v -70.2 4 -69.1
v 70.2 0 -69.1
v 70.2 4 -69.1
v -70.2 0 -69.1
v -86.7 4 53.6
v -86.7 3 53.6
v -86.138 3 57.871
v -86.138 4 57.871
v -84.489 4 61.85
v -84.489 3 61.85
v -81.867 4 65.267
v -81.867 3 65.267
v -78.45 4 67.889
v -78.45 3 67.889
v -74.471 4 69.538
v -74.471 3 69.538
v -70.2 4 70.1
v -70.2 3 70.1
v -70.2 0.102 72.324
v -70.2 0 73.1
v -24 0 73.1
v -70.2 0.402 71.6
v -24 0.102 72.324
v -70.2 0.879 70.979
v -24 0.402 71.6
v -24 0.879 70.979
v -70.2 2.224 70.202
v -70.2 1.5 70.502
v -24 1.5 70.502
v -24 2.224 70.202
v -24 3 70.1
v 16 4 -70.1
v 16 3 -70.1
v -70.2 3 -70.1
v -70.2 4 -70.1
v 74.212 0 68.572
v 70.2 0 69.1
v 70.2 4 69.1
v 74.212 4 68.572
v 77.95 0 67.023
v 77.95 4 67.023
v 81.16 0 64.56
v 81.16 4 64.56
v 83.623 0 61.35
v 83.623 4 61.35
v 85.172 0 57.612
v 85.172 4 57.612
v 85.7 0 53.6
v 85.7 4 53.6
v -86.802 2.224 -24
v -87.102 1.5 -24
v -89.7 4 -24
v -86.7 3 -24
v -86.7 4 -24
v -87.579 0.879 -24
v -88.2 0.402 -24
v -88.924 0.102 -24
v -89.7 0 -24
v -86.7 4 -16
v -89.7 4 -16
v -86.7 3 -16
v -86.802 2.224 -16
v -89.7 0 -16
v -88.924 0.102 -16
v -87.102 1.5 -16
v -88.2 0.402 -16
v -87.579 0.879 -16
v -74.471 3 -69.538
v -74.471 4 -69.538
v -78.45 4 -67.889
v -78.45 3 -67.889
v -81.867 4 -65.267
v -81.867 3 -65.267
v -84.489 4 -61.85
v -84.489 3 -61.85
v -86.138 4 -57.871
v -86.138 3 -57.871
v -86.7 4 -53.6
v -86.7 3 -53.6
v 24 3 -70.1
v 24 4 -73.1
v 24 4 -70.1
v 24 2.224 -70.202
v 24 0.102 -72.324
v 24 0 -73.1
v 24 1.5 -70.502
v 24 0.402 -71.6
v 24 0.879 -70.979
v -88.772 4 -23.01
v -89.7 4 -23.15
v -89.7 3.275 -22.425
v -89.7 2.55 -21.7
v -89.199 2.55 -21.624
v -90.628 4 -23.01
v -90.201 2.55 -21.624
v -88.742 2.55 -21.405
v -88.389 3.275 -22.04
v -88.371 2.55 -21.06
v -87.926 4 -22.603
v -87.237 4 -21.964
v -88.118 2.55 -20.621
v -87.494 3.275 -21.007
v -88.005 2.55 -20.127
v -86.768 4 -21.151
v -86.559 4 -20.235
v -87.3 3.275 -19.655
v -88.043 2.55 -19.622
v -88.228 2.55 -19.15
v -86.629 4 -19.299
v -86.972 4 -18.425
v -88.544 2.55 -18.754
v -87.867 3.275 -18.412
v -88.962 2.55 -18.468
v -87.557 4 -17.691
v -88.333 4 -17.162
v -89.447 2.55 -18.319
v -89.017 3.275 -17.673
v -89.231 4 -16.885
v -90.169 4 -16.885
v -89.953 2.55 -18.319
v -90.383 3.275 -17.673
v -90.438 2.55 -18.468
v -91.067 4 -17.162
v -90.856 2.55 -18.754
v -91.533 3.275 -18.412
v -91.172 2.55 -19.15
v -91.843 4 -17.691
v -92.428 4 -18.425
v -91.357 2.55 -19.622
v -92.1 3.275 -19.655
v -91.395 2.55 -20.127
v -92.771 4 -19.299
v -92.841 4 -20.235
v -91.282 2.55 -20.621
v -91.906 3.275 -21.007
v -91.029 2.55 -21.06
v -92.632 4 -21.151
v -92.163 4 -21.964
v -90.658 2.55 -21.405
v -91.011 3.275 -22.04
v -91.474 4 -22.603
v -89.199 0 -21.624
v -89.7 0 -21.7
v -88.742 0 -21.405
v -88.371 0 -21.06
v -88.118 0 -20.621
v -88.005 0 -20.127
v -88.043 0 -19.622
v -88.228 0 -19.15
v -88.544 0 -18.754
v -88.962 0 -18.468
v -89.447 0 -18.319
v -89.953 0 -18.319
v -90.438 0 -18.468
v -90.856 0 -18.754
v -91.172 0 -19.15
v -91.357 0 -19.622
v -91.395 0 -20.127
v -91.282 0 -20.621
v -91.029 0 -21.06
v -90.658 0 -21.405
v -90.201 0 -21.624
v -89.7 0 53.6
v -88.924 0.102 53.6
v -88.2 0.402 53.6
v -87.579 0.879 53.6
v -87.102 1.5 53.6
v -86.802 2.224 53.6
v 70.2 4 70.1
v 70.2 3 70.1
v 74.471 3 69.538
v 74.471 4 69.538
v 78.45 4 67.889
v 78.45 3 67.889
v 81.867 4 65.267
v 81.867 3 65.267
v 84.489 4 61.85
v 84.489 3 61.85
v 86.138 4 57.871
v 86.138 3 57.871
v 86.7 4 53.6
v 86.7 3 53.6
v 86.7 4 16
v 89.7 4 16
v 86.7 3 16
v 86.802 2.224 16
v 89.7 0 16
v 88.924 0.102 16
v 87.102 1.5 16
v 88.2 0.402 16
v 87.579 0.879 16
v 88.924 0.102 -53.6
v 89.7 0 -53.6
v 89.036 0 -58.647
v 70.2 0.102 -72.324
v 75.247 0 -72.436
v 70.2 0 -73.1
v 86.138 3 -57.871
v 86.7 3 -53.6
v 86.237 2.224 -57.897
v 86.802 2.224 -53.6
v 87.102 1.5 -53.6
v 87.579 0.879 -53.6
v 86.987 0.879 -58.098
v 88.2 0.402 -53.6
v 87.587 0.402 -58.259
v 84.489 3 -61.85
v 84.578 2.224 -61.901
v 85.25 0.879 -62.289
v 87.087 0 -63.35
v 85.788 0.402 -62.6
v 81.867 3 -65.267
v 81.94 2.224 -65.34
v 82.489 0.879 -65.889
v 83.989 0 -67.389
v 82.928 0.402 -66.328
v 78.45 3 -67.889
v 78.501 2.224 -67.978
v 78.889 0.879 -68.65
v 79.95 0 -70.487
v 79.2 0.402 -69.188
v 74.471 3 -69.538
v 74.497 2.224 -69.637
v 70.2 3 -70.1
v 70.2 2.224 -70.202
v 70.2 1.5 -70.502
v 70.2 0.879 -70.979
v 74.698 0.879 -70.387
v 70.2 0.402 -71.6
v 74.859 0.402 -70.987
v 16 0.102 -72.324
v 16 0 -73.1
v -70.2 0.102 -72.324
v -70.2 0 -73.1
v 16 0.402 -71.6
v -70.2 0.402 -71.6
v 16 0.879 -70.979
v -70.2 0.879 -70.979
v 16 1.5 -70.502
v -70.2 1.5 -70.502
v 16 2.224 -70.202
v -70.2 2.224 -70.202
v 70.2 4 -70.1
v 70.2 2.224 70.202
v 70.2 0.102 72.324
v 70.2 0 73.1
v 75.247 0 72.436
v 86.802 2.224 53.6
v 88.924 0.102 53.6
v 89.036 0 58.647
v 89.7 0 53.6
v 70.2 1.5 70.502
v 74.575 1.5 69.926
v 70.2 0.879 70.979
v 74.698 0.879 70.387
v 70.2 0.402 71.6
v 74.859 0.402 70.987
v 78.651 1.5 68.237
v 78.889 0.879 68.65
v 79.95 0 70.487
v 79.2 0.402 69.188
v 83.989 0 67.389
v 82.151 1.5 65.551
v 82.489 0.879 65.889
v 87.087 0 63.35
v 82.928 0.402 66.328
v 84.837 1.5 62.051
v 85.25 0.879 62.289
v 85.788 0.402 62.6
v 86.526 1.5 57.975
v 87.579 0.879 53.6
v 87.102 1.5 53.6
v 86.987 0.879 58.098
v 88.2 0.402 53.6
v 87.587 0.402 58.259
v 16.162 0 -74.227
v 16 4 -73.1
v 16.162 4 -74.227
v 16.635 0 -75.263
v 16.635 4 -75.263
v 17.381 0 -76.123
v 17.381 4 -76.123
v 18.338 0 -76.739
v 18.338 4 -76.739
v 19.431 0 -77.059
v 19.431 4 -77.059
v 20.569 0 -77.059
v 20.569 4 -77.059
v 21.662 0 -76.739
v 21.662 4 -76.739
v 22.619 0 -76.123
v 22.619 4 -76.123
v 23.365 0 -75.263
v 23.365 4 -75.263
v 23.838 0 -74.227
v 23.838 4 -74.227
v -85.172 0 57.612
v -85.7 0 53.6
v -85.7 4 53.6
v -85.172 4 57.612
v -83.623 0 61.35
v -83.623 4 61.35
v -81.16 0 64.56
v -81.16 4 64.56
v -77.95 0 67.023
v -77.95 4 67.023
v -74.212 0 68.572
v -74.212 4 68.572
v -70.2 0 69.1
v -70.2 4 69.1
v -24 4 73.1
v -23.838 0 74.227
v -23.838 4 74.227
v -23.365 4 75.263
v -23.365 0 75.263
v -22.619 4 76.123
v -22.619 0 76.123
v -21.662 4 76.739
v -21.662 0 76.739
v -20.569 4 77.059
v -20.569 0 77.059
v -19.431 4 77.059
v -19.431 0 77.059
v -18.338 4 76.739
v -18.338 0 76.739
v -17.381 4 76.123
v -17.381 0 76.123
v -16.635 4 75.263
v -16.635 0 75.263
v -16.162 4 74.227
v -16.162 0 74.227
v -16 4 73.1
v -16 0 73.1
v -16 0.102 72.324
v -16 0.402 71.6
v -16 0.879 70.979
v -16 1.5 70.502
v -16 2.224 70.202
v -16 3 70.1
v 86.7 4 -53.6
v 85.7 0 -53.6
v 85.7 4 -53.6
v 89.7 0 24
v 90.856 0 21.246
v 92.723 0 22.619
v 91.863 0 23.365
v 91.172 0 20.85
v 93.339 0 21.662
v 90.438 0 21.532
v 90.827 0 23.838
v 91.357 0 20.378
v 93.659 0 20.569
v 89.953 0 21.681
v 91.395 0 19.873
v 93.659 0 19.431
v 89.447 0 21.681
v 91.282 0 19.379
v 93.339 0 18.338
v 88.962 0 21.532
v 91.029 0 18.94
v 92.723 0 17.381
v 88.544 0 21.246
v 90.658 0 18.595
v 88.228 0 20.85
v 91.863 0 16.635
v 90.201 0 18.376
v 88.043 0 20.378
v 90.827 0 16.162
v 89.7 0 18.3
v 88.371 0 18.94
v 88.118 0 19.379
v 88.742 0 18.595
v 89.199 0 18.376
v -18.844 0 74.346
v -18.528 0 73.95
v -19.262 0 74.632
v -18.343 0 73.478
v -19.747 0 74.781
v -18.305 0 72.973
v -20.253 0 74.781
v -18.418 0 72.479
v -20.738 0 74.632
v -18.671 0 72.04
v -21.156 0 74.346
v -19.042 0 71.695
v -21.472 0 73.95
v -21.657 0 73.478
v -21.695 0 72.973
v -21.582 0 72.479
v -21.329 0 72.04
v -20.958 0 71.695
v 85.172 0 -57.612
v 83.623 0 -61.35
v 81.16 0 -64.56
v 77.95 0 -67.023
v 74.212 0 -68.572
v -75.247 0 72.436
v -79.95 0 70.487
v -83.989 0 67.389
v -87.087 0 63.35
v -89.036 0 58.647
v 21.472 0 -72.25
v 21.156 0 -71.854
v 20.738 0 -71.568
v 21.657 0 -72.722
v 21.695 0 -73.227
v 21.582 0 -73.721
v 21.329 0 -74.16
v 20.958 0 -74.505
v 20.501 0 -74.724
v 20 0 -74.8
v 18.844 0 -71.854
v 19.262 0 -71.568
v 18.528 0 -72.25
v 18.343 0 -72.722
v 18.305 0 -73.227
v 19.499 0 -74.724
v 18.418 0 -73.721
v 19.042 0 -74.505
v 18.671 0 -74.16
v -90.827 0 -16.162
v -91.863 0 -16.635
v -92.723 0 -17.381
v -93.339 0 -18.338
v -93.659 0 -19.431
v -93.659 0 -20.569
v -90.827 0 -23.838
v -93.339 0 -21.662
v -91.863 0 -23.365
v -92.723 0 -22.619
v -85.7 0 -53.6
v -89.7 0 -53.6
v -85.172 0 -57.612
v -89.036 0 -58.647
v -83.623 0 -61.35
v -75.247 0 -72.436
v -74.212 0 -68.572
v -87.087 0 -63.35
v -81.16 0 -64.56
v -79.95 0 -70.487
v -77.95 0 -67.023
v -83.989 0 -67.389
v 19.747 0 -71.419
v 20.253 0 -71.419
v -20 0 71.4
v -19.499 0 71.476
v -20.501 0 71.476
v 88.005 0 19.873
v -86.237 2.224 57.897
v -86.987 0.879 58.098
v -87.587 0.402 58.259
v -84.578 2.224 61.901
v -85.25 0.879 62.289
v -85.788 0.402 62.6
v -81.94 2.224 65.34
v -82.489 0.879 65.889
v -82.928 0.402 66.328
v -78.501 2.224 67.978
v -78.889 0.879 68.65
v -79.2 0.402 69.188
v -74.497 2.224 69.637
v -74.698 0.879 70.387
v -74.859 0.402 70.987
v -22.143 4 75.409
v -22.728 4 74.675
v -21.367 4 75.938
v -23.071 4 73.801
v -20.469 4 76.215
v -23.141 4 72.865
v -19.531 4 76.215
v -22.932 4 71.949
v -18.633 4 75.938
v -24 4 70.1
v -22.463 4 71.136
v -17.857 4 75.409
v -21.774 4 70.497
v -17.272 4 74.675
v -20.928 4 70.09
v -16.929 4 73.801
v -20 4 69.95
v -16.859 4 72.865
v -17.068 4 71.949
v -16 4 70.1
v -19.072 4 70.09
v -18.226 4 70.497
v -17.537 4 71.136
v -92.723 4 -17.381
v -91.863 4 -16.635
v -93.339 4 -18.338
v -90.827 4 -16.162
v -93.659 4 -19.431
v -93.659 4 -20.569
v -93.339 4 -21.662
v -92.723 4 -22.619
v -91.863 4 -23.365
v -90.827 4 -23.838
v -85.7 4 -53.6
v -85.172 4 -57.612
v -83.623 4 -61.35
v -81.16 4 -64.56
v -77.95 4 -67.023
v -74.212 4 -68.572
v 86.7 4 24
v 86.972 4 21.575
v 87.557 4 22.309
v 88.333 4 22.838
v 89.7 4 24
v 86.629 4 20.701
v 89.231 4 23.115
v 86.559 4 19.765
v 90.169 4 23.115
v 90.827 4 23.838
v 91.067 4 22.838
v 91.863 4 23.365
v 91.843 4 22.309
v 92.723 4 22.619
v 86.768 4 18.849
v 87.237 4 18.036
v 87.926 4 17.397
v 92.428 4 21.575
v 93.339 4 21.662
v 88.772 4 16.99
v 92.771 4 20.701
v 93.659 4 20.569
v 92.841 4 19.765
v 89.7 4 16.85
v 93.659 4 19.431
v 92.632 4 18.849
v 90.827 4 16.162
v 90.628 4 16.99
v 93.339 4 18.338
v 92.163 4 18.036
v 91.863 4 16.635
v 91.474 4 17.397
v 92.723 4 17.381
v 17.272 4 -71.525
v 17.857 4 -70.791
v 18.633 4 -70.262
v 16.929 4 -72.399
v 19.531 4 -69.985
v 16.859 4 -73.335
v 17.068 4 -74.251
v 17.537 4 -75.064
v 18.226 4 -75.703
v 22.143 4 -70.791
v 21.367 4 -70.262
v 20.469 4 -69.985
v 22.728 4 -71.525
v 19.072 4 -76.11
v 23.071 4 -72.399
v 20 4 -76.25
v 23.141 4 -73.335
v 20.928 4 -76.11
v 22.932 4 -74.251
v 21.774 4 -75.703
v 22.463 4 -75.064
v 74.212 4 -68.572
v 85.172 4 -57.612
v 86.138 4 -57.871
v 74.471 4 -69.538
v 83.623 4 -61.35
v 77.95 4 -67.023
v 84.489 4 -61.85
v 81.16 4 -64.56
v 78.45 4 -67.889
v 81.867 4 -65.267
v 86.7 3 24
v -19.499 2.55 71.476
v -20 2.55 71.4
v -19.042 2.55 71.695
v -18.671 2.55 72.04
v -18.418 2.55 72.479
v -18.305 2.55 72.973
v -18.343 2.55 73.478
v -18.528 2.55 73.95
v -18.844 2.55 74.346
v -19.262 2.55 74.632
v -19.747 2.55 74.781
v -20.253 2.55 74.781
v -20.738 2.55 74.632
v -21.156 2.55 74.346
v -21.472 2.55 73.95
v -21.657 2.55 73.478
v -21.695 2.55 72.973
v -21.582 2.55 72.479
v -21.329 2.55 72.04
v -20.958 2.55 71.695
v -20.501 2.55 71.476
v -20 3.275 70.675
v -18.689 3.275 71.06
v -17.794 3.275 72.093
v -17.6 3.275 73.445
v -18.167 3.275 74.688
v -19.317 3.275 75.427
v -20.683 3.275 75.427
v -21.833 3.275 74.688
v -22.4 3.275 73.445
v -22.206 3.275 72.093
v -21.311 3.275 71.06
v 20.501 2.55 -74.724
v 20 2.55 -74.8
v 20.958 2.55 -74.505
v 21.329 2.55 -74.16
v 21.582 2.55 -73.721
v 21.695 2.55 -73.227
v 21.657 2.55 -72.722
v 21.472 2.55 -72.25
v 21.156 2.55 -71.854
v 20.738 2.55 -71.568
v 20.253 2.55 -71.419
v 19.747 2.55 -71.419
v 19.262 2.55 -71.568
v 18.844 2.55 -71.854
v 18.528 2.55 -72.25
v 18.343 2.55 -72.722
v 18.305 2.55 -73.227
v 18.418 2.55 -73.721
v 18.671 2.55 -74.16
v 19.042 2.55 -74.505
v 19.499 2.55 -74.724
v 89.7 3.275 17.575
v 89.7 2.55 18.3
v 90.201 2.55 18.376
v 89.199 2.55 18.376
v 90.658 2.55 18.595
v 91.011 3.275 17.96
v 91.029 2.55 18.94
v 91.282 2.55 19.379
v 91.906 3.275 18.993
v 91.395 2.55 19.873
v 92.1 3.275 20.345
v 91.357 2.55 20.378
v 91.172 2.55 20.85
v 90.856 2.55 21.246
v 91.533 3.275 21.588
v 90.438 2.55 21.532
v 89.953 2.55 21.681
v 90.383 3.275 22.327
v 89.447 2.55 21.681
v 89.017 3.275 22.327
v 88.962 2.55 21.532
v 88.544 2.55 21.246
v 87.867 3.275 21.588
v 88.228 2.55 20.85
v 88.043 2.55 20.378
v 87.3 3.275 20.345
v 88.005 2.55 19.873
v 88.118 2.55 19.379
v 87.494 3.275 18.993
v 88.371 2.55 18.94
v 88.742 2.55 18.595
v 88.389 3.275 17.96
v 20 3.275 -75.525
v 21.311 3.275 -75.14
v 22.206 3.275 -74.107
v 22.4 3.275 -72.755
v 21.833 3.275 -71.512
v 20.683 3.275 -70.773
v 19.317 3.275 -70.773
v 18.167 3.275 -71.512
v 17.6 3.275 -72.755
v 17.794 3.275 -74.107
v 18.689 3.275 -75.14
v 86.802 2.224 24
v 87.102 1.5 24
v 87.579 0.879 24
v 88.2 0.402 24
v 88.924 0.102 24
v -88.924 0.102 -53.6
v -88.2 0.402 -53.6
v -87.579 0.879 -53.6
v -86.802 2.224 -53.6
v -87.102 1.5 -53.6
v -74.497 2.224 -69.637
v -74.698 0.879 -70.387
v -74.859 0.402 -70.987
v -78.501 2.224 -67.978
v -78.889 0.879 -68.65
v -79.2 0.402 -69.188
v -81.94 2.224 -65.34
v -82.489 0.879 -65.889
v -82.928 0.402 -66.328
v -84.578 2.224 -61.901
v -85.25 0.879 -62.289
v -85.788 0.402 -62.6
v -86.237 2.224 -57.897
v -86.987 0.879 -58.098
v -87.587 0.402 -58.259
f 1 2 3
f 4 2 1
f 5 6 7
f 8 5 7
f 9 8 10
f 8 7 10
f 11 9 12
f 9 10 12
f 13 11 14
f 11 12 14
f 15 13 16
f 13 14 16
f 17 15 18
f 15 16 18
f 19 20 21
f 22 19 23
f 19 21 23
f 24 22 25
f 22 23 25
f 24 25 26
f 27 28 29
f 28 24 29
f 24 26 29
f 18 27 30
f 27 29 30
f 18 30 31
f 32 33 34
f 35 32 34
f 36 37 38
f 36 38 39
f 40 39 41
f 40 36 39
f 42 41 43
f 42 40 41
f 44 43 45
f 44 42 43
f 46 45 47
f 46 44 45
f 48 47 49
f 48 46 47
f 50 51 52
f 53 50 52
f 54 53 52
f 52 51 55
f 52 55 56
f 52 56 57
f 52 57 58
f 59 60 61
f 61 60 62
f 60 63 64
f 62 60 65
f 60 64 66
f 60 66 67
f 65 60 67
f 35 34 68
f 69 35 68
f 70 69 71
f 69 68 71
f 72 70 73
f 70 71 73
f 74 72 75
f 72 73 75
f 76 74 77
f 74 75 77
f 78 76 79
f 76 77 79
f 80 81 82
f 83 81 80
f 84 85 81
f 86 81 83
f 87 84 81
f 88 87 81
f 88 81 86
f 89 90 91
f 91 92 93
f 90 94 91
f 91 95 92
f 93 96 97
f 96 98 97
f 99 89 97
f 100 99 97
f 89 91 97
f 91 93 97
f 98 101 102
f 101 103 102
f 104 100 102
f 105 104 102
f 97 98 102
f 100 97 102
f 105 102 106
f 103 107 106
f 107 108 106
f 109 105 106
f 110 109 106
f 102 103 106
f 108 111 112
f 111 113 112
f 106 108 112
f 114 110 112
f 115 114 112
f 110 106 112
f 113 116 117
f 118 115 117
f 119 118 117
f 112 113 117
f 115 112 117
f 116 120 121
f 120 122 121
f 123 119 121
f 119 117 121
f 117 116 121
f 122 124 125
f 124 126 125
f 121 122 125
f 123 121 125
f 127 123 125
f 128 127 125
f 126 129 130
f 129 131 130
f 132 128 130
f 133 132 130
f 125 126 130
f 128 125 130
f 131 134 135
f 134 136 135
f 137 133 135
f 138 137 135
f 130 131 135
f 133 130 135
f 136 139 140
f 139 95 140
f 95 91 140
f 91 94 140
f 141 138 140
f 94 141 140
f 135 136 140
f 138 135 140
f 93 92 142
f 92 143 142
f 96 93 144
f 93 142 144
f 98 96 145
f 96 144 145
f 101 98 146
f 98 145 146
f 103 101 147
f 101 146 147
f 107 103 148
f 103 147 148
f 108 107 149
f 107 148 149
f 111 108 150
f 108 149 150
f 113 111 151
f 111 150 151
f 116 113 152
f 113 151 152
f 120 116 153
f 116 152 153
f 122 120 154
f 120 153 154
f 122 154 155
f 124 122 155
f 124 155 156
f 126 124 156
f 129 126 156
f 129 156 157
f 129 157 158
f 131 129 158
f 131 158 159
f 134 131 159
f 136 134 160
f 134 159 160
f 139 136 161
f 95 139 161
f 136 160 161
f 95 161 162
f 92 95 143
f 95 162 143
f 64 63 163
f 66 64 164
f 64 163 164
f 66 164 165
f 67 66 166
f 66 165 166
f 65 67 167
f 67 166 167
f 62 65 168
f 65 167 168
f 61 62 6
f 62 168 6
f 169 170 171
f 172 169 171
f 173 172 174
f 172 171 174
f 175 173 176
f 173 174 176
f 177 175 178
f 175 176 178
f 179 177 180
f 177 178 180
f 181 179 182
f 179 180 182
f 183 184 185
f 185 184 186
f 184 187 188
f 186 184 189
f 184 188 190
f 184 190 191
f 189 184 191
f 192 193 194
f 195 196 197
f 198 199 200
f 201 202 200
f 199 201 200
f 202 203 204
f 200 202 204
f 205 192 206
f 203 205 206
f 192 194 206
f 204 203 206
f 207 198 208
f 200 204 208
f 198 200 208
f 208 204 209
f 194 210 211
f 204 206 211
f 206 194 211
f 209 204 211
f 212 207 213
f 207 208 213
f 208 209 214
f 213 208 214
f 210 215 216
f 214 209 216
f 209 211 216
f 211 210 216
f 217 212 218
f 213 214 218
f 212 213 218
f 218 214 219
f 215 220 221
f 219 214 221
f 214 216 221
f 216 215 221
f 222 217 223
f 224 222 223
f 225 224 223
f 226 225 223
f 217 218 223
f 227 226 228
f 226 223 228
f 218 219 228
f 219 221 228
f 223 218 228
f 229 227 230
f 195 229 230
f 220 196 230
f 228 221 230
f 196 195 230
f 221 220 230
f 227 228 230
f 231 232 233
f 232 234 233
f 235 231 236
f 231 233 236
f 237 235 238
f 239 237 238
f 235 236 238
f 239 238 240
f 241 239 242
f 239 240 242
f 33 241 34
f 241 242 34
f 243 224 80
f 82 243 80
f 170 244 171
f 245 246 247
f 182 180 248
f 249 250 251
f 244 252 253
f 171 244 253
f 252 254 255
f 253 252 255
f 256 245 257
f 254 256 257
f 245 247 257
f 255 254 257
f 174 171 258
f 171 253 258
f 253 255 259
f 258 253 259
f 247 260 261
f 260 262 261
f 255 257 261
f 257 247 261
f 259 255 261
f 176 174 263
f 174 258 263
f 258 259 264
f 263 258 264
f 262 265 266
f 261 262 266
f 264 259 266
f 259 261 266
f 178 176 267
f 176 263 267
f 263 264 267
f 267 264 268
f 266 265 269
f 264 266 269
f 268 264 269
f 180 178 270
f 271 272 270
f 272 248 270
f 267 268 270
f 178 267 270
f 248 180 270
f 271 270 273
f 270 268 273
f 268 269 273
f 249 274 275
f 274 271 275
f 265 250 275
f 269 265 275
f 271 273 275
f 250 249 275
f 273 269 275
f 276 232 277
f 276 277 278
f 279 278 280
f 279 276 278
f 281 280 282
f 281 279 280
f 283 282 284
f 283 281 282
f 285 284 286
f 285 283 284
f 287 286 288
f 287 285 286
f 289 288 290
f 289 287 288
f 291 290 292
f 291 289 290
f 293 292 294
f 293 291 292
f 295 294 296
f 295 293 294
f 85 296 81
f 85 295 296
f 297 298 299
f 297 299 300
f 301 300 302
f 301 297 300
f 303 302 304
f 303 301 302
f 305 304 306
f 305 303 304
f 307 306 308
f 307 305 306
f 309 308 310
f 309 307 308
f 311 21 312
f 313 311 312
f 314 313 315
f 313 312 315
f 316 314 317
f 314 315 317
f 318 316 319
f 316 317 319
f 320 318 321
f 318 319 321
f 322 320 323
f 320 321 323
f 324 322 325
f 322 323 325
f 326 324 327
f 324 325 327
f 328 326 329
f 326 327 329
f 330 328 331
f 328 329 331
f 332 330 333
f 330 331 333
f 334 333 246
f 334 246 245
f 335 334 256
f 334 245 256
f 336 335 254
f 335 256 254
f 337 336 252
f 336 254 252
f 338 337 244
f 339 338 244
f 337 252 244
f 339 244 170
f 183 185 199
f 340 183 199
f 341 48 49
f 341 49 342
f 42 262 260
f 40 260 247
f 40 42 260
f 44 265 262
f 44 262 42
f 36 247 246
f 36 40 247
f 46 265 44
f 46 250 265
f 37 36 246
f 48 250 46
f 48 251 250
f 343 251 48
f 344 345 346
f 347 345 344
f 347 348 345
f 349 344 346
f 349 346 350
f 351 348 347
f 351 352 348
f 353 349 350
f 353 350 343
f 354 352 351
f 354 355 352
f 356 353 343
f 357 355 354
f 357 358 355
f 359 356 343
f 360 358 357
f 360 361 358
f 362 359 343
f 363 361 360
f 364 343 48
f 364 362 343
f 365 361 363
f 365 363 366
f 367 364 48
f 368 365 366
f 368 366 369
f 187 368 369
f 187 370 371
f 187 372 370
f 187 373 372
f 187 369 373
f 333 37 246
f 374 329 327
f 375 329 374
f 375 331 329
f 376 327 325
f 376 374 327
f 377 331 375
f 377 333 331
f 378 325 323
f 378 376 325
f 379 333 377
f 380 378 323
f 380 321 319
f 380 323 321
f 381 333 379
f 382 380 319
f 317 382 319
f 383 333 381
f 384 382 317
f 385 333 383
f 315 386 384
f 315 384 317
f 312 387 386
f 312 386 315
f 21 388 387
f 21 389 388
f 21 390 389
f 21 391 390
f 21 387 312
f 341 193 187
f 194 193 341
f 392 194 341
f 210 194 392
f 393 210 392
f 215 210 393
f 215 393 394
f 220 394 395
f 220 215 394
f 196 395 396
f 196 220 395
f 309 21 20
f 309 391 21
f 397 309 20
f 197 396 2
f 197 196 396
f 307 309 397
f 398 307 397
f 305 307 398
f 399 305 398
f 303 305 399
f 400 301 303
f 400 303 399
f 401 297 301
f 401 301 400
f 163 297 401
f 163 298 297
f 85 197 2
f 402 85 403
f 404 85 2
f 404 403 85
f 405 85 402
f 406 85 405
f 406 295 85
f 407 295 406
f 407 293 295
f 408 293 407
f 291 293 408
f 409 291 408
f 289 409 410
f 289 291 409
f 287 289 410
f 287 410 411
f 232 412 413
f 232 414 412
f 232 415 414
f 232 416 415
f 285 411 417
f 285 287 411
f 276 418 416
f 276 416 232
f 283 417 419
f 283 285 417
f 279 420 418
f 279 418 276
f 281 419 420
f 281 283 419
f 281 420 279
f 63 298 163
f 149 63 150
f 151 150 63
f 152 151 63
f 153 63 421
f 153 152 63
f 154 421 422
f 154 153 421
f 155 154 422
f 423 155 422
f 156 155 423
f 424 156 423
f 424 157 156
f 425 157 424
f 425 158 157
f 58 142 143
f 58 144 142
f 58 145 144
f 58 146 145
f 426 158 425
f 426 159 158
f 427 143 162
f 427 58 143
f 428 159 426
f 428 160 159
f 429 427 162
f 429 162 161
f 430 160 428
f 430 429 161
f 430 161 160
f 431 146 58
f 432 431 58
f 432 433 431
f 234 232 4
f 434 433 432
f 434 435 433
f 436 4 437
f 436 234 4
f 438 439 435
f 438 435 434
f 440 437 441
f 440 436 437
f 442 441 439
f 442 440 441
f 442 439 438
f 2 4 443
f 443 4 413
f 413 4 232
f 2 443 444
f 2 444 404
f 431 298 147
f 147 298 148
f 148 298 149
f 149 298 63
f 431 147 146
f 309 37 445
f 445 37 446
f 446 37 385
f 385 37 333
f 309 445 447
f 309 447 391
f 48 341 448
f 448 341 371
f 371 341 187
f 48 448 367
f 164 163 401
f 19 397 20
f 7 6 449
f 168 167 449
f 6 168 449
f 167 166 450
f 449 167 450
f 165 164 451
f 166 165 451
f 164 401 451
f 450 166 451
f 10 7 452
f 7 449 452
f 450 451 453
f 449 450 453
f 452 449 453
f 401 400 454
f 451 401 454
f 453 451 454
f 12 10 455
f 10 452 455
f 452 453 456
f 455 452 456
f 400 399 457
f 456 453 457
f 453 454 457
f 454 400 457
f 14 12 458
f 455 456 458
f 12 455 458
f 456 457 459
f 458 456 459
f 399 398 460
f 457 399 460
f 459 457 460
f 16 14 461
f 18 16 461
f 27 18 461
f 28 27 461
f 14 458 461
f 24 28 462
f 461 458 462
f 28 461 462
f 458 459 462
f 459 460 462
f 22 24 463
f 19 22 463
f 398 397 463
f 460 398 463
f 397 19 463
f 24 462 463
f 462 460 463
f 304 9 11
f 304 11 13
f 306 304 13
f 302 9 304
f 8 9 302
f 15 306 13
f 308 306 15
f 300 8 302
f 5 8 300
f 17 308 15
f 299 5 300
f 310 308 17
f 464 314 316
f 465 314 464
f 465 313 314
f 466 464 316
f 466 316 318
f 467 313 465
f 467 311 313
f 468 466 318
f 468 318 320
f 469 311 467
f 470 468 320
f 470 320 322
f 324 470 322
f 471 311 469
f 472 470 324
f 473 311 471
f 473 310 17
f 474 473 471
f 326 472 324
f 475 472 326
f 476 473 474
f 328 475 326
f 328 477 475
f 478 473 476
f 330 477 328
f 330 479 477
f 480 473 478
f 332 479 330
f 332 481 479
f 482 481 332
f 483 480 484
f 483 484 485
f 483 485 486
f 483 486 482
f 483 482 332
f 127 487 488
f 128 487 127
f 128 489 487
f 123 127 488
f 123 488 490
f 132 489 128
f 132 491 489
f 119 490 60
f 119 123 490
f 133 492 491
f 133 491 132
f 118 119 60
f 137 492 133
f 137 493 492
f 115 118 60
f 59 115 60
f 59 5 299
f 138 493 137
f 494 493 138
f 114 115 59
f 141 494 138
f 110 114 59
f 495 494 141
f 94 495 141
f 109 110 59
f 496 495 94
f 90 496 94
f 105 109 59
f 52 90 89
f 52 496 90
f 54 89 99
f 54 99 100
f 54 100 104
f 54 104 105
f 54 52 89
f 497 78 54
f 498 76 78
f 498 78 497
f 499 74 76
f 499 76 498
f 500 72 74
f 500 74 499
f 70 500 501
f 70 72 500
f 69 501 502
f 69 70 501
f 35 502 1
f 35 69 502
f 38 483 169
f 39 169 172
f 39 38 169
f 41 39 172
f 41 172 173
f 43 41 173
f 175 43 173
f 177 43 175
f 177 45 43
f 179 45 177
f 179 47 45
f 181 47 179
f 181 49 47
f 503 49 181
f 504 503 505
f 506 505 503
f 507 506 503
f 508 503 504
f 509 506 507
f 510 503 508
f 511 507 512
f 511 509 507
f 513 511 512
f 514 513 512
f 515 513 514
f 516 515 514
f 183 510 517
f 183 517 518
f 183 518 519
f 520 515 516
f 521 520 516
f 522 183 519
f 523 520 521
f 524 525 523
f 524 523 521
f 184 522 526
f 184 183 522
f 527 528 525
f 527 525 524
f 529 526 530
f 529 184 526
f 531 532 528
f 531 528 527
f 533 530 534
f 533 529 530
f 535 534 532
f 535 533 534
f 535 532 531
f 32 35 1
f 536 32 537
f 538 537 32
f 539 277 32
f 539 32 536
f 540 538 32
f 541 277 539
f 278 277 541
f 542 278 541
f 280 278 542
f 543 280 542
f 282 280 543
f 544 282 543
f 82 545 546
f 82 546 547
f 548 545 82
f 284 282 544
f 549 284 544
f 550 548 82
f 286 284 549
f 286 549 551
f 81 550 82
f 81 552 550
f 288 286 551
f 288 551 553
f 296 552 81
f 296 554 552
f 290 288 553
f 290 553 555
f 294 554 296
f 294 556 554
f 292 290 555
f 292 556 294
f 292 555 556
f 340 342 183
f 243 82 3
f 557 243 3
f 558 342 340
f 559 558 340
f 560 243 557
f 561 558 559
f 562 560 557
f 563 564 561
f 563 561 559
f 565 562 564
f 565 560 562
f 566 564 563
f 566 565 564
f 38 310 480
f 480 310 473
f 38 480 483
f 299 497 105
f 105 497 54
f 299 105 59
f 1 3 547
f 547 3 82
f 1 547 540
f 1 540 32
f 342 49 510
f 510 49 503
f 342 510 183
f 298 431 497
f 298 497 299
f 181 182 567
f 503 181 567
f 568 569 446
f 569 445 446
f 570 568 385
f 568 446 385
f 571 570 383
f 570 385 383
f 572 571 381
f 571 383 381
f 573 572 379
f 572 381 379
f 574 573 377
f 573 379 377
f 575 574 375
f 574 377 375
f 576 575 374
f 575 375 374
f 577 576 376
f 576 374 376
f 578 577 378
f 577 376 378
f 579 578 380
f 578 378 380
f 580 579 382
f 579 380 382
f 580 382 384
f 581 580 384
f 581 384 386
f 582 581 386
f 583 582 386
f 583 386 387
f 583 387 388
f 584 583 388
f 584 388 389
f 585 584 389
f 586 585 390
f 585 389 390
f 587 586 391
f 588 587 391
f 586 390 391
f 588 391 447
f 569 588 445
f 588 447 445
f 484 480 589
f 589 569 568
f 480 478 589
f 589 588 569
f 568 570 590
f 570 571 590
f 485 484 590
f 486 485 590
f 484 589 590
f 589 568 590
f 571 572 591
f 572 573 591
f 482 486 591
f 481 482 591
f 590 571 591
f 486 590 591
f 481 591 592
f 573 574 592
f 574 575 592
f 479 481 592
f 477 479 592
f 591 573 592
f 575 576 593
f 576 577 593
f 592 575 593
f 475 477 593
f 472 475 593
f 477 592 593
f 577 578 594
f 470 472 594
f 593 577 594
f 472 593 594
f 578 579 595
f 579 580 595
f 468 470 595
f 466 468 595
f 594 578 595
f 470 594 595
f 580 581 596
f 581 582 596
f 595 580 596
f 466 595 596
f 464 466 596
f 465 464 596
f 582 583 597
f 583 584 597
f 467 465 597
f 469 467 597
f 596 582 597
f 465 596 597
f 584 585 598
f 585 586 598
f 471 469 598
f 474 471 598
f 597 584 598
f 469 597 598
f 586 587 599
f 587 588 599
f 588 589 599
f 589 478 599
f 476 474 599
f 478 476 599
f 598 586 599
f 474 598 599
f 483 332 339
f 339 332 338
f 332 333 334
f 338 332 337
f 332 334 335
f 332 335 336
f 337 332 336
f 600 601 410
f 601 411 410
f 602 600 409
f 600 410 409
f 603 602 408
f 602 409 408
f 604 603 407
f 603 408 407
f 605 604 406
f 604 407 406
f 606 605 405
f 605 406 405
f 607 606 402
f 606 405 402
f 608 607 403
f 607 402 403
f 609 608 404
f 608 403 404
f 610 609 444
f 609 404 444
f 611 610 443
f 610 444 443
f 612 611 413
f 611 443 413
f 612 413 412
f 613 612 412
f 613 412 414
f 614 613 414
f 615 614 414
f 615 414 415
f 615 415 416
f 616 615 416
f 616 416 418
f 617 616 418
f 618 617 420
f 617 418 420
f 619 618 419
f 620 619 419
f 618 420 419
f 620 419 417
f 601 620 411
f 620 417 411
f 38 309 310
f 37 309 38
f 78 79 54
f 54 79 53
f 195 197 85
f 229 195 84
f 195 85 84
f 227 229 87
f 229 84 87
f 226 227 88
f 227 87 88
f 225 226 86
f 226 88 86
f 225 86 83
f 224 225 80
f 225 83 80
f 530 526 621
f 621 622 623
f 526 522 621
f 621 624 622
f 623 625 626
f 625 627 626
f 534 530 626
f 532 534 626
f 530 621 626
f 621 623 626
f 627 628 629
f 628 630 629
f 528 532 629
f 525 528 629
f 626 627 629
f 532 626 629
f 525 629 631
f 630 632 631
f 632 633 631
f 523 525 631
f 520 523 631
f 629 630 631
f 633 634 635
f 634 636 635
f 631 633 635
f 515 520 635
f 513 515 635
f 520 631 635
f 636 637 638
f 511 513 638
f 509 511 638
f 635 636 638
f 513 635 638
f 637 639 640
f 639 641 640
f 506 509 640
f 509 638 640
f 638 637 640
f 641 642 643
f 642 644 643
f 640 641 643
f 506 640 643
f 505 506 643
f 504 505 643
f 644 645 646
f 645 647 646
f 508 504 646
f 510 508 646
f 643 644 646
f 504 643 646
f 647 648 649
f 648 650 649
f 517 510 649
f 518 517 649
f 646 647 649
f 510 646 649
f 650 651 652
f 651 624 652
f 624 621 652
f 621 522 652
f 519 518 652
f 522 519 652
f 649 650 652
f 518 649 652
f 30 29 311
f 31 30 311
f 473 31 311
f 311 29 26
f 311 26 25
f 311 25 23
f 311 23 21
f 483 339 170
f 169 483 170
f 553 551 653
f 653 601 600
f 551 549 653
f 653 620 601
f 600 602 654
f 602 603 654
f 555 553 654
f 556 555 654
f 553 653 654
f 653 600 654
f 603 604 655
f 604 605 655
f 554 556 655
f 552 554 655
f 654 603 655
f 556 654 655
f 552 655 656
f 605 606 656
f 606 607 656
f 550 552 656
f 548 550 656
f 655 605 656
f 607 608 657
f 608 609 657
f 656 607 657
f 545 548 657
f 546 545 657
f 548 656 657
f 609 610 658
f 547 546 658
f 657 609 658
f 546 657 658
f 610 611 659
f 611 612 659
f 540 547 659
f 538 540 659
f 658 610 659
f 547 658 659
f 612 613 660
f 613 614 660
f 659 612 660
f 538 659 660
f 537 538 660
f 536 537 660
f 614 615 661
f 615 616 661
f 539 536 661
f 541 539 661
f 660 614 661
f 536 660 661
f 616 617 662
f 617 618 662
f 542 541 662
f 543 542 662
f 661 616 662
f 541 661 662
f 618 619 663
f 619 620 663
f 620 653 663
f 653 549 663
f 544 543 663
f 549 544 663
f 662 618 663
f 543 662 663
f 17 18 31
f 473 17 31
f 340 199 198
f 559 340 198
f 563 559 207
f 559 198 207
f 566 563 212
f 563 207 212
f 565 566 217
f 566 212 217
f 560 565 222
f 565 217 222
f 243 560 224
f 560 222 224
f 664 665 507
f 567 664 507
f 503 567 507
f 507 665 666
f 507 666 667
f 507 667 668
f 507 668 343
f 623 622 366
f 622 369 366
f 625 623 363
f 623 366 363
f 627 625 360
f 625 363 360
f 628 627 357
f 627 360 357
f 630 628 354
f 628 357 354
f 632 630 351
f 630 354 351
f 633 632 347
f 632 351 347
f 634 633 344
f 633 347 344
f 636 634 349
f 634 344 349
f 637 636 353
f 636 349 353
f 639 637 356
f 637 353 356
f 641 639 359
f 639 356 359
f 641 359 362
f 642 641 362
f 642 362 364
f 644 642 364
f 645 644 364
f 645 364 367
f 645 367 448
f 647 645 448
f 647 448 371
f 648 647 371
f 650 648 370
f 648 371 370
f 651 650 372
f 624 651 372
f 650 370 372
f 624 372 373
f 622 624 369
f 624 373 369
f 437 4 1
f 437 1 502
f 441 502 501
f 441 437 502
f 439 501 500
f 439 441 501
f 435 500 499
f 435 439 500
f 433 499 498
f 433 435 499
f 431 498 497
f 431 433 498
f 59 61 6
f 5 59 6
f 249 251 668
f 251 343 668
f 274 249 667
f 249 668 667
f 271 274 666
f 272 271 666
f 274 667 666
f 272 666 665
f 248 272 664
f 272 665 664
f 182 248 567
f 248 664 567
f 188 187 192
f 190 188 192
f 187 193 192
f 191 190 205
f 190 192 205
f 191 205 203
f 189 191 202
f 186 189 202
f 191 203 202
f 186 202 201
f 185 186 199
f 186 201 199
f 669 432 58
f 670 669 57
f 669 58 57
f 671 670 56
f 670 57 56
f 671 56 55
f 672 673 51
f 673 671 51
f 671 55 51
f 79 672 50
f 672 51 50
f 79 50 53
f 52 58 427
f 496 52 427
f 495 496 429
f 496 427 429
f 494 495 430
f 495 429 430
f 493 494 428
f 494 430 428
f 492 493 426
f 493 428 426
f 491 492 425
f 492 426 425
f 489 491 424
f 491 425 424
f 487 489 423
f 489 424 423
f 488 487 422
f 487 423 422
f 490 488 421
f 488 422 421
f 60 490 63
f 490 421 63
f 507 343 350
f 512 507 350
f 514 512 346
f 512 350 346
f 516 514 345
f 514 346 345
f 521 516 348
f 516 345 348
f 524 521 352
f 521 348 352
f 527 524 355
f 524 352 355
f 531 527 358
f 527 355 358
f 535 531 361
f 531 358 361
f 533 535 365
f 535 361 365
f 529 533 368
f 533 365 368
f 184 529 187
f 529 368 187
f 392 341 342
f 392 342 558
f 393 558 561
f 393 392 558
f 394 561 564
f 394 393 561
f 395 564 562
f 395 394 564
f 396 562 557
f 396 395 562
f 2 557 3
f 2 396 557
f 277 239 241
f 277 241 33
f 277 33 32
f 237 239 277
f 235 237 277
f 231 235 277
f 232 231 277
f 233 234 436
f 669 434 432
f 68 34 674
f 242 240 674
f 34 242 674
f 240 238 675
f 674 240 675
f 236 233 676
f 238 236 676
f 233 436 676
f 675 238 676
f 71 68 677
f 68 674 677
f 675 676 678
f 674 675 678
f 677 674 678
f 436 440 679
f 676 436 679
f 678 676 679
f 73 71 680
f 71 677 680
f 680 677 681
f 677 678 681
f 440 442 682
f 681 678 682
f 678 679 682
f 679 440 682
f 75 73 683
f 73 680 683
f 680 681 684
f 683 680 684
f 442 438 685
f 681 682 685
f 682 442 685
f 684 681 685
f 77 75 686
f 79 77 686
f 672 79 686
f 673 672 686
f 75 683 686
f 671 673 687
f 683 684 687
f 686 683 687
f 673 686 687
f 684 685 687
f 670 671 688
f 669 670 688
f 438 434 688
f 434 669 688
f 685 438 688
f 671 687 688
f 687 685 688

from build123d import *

# Parameters (mm, degrees)
BOSS_EXTRUDE1_DEPTH                             = 4
SKETCH2_R                                       = 1.6
BOSS_EXTRUDE2_DEPTH                             = 4
CSK_FOR_M3_FLAT_HEAD_MACHINE_SCREW1_D           = 3.4
CSK_FOR_M3_FLAT_HEAD_MACHINE_SCREW1_CSINK_D     = 6.3
CSK_FOR_M3_FLAT_HEAD_MACHINE_SCREW1_CSINK_ANGLE = 90


with BuildPart() as part:
    # Sketch1 → Boss-Extrude1 (new body)
    with BuildSketch(Plane(origin=(0, 0, 0), x_dir=(1, 0, 0), z_dir=(0, 1, 0))):
        with BuildLine():
            Line((86.7, -53.6), (86.7, 53.6))
            ThreePointArc((86.7, 53.6), (81.86726189, 65.26726189), (70.2, 70.1))
            Line((70.2, 70.1), (-70.2, 70.1))
            ThreePointArc((-70.2, 70.1), (-81.86726189, 65.26726189), (-86.7, 53.6))
            Line((-86.7, 53.6), (-86.7, -53.6))
            ThreePointArc((-86.7, -53.6), (-81.86726189, -65.26726189), (-70.2, -70.1))
            Line((-70.2, -70.1), (70.2, -70.1))
            ThreePointArc((70.2, -70.1), (81.86726189, -65.26726189), (86.7, -53.6))
        make_face()
        with BuildLine():
            Line((-70.2, -69.1), (70.2, -69.1))
            ThreePointArc((70.2, -69.1), (81.160155108, -64.560155108), (85.7, -53.6))
            Line((85.7, -53.6), (85.7, 53.6))
            ThreePointArc((85.7, 53.6), (81.160155108, 64.560155108), (70.2, 69.1))
            Line((70.2, 69.1), (-70.2, 69.1))
            ThreePointArc((-70.2, 69.1), (-81.160155108, 64.560155108), (-85.7, 53.6))
            Line((-85.7, 53.6), (-85.7, -53.6))
            ThreePointArc((-85.7, -53.6), (-81.160155108, -64.560155108), (-70.2, -69.1))
        make_face(mode=Mode.SUBTRACT)
    extrude(amount=BOSS_EXTRUDE1_DEPTH)

    # Sweep1: sweep along a path in Sketch5
    with BuildLine(Plane.XZ) as sweep1_path:
        Line((86.7, 53.6), (86.7, -53.6))
        ThreePointArc((86.7, -53.6), (81.86726189, -65.26726189), (70.2, -70.1))
        Line((70.2, -70.1), (-70.2, -70.1))
        ThreePointArc((-70.2, -70.1), (-81.86726189, -65.26726189), (-86.7, -53.6))
        Line((-86.7, -53.6), (-86.7, 53.6))
        ThreePointArc((-86.7, 53.6), (-81.86726189, 65.26726189), (-70.2, 70.1))
        Line((-70.2, 70.1), (70.2, 70.1))
        ThreePointArc((70.2, 70.1), (81.86726189, 65.26726189), (86.7, 53.6))
    # Sketch4 → Sweep1 (sweep)
    with BuildSketch(Plane.XY):
        with BuildLine():
            Line((-86.7, 0), (-89.7, 0))
            ThreePointArc((-89.7, 0), (-87.578679656, 0.878679656), (-86.7, 3))
            Line((-86.7, 3), (-86.7, 0))
        make_face()
    sweep(path=sweep1_path.line)

    # Sketch2 → Boss-Extrude2 (add, through all)
    # profile 1 of 4: a face of its own
    with BuildSketch(Plane(origin=(0, 0, 0), x_dir=(1, 0, 0), z_dir=(0, 1, 0))):
        with BuildLine():
            Line((-86.7, 24), (-89.7, 24))
            ThreePointArc((-89.7, 24), (-93.7, 20), (-89.7, 16))
            Line((-89.7, 16), (-86.7, 16))
            Line((-86.7, 16), (-86.7, 24))
        make_face()
        with Locations(Location((-89.7, 20, 0), (0, 0, 270))):
            Circle(SKETCH2_R, mode=Mode.SUBTRACT)
    # profile 2 of 4: a face of its own
    with BuildSketch(Plane(origin=(0, 0, 0), x_dir=(1, 0, 0), z_dir=(0, 1, 0))):
        with BuildLine():
            Line((16, 70.1), (16, 73.1))
            ThreePointArc((16, 73.1), (20, 77.1), (24, 73.1))
            Line((24, 73.1), (24, 70.1))
            Line((24, 70.1), (16, 70.1))
        make_face()
        with Locations((20, 73.1)):
            Circle(SKETCH2_R, mode=Mode.SUBTRACT)
    # profile 3 of 4: a face of its own
    with BuildSketch(Plane(origin=(0, 0, 0), x_dir=(1, 0, 0), z_dir=(0, 1, 0))):
        with BuildLine():
            Line((-24, -70.1), (-24, -73.1))
            ThreePointArc((-24, -73.1), (-20, -77.1), (-16, -73.1))
            Line((-16, -73.1), (-16, -70.1))
            Line((-16, -70.1), (-24, -70.1))
        make_face()
        with Locations(Location((-20, -73.1, 0), (0, 0, 180))):
            Circle(SKETCH2_R, mode=Mode.SUBTRACT)
    # profile 4 of 4: a face of its own
    with BuildSketch(Plane(origin=(0, 0, 0), x_dir=(1, 0, 0), z_dir=(0, 1, 0))):
        with BuildLine():
            Line((86.7, -24), (89.7, -24))
            ThreePointArc((89.7, -24), (93.7, -20), (89.7, -16))
            Line((89.7, -16), (86.7, -16))
            Line((86.7, -16), (86.7, -24))
        make_face()
        with Locations(Location((89.7, -20, 0), (0, 0, 270))):
            Circle(SKETCH2_R, mode=Mode.SUBTRACT)
    extrude(amount=BOSS_EXTRUDE2_DEPTH)

    # CSK for M3 Flat Head Machine Screw1 (through all)
    with Locations(Plane(origin=(20, 4, -73.1), x_dir=(0, 0, 1), z_dir=(0, 1, 0))):
        with Locations((0, 0), (53.1, -109.7), (93.1, 69.7), (146.2, -40)):
            CounterSinkHole(CSK_FOR_M3_FLAT_HEAD_MACHINE_SCREW1_D / 2, CSK_FOR_M3_FLAT_HEAD_MACHINE_SCREW1_CSINK_D / 2, counter_sink_angle=CSK_FOR_M3_FLAT_HEAD_MACHINE_SCREW1_CSINK_ANGLE)


solid = part.part
